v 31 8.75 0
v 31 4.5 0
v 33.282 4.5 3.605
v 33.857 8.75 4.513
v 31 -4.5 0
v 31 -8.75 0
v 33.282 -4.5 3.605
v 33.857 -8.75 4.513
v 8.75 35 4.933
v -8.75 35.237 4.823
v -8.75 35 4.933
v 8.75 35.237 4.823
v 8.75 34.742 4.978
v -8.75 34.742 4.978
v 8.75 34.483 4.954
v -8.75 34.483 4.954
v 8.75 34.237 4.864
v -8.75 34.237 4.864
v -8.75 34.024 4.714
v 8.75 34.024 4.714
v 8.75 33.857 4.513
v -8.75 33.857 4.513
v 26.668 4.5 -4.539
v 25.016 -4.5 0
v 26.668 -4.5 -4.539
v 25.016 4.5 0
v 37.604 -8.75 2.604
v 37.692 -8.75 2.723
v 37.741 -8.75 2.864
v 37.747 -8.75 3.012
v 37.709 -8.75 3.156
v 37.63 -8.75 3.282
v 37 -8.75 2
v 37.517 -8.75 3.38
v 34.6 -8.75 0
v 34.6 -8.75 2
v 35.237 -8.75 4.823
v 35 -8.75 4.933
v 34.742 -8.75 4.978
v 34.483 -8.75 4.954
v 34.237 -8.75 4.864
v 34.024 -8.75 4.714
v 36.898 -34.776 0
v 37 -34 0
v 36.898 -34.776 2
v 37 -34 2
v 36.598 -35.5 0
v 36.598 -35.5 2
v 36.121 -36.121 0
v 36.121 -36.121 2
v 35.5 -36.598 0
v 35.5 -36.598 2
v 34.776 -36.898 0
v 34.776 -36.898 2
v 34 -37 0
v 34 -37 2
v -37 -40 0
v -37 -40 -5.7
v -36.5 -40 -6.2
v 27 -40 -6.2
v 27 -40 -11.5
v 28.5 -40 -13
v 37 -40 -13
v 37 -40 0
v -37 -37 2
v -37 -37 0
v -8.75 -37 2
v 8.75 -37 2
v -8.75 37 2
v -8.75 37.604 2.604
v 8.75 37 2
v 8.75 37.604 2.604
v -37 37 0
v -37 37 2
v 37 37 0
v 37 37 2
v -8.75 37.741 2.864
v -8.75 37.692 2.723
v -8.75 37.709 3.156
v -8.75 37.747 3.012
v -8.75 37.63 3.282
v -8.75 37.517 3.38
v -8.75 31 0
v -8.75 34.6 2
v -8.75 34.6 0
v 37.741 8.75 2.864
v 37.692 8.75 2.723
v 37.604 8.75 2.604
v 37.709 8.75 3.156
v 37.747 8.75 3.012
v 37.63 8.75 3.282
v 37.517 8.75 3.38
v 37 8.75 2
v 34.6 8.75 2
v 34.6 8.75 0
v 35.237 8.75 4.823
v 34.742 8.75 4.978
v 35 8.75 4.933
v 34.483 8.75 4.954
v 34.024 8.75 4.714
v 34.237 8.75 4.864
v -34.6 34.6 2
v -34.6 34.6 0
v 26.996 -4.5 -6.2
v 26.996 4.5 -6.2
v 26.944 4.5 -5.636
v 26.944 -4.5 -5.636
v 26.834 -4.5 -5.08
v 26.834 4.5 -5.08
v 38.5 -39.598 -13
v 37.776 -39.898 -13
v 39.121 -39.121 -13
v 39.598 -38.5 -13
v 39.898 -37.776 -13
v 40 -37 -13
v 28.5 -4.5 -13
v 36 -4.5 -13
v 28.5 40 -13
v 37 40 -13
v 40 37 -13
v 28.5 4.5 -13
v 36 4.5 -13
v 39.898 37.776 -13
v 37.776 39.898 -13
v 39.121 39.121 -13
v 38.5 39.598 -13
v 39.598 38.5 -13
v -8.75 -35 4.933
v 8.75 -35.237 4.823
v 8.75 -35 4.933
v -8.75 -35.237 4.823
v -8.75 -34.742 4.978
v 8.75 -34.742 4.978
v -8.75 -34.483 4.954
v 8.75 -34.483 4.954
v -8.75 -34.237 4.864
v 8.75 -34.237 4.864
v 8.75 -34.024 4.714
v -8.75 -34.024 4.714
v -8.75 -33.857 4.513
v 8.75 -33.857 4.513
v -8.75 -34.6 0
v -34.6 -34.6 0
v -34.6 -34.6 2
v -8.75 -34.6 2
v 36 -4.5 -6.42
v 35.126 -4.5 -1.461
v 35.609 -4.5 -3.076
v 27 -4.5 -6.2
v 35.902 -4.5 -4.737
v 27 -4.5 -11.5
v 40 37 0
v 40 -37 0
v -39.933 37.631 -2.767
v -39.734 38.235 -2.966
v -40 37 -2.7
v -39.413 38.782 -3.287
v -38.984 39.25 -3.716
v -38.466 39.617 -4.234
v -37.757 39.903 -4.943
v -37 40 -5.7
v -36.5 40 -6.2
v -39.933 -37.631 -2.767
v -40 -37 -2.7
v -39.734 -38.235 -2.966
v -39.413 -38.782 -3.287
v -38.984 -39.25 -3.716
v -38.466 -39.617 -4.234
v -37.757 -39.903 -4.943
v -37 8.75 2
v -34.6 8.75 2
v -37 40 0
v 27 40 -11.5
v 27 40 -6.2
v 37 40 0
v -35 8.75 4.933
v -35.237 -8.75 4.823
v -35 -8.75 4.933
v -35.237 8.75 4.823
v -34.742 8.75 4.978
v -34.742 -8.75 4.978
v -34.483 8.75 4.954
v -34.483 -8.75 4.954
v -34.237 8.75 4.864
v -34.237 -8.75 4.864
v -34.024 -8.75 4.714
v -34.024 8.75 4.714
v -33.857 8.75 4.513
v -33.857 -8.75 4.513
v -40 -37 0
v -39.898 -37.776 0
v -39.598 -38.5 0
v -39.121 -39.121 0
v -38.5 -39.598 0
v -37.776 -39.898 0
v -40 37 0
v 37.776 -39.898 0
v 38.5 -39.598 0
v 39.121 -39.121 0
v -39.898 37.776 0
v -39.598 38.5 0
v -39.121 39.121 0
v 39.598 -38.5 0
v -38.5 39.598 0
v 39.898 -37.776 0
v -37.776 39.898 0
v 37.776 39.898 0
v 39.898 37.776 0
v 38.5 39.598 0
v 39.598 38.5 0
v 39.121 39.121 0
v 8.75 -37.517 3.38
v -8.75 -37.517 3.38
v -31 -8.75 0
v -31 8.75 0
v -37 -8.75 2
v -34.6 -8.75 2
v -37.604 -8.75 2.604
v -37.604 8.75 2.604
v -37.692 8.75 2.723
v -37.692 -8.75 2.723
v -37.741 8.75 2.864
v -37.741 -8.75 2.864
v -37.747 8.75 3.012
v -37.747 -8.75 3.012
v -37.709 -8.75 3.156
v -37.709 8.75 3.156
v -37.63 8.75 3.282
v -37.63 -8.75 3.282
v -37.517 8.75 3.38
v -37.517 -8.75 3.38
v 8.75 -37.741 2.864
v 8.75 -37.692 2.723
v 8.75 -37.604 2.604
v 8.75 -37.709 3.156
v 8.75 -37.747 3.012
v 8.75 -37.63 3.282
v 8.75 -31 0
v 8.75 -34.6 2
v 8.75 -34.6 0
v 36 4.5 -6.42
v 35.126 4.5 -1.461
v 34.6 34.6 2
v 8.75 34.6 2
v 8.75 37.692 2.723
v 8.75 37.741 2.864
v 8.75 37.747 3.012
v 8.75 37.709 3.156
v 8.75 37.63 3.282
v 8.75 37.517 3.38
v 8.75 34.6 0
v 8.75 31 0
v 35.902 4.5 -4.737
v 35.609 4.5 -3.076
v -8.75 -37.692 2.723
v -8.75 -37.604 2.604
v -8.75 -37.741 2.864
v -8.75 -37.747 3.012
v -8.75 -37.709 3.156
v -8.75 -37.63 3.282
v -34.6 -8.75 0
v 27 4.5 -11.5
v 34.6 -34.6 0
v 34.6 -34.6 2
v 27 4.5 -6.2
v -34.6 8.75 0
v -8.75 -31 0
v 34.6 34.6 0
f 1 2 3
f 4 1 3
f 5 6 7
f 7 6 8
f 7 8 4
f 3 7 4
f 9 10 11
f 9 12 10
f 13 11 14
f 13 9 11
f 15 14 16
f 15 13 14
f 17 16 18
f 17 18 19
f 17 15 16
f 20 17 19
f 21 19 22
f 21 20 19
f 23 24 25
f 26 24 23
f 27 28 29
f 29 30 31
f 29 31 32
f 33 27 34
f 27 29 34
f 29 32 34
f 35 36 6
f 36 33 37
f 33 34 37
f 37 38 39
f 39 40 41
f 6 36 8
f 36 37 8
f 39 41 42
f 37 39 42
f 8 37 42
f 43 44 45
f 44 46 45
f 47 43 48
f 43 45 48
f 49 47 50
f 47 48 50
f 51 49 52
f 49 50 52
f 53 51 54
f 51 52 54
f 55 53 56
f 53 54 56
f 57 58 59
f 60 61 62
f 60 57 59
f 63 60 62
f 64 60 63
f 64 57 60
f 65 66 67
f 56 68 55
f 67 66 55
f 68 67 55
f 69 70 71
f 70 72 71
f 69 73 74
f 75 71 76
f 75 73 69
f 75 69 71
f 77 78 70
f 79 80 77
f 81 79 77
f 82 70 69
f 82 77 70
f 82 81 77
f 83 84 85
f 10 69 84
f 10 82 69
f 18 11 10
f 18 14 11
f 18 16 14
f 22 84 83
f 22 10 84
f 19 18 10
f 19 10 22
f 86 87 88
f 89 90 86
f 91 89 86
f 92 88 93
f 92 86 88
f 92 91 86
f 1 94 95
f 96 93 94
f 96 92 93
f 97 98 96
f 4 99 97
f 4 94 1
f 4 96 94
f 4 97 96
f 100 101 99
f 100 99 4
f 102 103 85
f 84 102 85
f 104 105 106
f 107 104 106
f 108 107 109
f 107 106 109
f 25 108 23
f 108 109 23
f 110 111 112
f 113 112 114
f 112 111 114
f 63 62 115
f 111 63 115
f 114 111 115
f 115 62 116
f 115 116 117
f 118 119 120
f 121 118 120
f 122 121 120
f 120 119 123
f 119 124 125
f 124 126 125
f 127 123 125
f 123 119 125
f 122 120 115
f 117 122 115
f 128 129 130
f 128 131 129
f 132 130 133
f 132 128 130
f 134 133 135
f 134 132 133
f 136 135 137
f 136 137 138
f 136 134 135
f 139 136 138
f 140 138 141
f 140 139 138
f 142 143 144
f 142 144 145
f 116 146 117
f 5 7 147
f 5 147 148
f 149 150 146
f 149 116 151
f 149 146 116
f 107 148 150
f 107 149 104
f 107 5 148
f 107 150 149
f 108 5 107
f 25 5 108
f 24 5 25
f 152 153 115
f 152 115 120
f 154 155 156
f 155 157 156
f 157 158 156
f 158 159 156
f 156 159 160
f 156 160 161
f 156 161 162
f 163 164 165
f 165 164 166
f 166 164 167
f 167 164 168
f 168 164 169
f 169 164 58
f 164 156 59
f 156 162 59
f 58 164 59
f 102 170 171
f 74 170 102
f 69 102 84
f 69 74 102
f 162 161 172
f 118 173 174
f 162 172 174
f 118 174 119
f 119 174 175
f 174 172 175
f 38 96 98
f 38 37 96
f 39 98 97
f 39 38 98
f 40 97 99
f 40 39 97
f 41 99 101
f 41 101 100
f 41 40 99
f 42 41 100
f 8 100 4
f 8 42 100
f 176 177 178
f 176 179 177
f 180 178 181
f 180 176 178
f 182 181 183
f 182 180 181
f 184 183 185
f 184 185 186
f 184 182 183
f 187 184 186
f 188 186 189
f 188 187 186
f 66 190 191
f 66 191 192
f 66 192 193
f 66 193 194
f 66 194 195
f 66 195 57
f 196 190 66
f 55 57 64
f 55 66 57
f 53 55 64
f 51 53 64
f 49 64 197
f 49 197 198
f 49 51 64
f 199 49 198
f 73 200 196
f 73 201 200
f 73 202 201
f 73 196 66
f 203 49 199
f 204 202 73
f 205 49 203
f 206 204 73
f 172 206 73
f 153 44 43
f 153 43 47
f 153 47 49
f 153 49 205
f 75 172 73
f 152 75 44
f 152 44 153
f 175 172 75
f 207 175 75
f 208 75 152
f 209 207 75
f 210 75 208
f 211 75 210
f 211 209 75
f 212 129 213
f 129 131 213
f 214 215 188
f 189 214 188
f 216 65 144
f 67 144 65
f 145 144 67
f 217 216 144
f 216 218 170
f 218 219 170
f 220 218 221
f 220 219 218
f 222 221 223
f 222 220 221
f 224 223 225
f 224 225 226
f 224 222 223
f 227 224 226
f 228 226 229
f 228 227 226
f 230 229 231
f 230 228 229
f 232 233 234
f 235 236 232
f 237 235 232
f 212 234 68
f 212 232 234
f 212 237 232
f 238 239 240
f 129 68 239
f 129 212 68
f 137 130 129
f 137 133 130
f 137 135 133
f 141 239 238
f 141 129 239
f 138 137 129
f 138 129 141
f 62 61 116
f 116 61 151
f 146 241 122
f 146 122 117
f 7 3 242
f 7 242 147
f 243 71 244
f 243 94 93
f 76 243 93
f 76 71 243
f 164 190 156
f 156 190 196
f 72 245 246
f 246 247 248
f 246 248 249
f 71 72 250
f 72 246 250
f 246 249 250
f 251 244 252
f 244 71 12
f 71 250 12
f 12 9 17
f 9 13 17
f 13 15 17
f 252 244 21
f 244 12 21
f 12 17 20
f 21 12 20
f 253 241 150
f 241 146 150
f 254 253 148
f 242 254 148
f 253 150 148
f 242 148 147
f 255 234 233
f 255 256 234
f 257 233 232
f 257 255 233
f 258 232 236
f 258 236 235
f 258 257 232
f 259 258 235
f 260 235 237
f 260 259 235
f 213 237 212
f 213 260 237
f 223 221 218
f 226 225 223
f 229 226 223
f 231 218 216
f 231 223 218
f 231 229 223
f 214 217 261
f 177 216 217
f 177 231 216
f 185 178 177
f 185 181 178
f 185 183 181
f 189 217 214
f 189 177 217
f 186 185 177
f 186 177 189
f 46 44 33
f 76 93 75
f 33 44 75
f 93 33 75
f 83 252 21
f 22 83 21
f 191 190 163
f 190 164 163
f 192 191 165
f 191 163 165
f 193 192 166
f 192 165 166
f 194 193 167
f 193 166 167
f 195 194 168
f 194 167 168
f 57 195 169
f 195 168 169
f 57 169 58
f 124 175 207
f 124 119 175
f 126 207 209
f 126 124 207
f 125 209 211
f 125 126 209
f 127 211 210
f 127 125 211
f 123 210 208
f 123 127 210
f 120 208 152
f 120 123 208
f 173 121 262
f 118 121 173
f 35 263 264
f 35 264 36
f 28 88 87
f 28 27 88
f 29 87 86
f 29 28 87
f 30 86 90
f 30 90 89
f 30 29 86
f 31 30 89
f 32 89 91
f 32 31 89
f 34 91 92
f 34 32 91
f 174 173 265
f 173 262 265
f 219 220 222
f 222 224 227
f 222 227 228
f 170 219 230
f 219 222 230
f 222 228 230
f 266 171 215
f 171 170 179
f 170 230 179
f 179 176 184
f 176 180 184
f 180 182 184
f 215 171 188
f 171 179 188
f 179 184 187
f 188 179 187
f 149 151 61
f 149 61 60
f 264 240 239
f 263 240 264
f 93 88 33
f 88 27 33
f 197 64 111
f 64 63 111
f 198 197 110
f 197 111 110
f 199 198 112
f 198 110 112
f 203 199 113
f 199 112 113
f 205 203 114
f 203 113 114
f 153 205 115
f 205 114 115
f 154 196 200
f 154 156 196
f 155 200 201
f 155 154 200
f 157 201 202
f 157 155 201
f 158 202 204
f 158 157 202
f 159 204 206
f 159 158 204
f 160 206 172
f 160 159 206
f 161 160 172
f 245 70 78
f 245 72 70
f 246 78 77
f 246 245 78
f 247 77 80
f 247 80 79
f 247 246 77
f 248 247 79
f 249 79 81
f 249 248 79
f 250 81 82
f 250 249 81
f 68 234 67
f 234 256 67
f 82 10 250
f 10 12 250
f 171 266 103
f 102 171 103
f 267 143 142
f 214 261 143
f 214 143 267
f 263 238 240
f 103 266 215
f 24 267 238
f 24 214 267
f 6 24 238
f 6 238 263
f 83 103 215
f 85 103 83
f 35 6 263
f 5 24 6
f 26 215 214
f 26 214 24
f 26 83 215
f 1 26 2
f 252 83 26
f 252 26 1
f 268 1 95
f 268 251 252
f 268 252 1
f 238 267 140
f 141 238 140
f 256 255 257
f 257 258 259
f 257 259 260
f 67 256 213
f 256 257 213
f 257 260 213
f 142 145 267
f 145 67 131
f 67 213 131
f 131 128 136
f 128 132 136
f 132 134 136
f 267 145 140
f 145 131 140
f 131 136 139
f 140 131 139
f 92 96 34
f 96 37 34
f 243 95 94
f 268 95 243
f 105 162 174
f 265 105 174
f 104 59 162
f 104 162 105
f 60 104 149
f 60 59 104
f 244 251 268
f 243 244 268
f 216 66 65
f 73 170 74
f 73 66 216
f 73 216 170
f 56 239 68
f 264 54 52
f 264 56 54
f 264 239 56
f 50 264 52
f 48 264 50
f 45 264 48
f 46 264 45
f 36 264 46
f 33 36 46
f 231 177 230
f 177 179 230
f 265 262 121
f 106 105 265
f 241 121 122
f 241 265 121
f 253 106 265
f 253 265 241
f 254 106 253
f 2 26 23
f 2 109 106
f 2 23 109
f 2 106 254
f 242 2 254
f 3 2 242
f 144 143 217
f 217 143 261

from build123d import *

# Parameters (mm, degrees)
SKETCH_W           = 80
SKETCH_H           = 80
PAD_DEPTH          = 13
PAD001_DEPTH       = 8.75
POLARPATTERN_COUNT = 4
SKETCH006_W        = 67
SKETCH006_H        = 6.8
POCKET_DEPTH       = 40.001
POCKET_DEPTH_BACK  = 40.001
SKETCH008_W        = 9
SKETCH008_H        = 9
CHAMFER_SIZE       = 3.5
FILLET_R           = 3
CHAMFER002_SIZE    = 1.5
SKETCH014_W        = 74
SKETCH014_H        = 74
SKETCH014_W_2      = 69.2
SKETCH014_H_2      = 69.2
PAD005_DEPTH       = 2
FILLET003_R        = 3


with BuildPart() as part:
    # Sketch → Pad (new body)
    with BuildSketch(Plane.XY):
        Rectangle(SKETCH_W, SKETCH_H)
    extrude(amount=-PAD_DEPTH)

    # Sketch001 → Pad001 (join, symmetric)
    with BuildSketch(Plane.YZ):
        with BuildLine():
            Line((31, 0), (33.85683, 4.513208))
            ThreePointArc((35.236626, 4.82331), (34.482504, 4.954025), (33.85683, 4.513208))
            Line((35.236626, 4.82331), (37.517423, 3.379581))
            ThreePointArc((37.603553, 2.603553), (37.746949, 3.012262), (37.517423, 3.379581))
            Line((37.603553, 2.603553), (37, 2))
            Line((37, 2), (37, 0))
            Line((37, 0), (31, 0))
        make_face()
    pad001 = extrude(amount=PAD001_DEPTH, both=True)

    # PolarPattern: Pad001 ×4 about axis
    polarpattern_axis = Axis((0, 0, 0), (0, 0, 1))
    for i in range(1, POLARPATTERN_COUNT):
        add(pad001.rotate(polarpattern_axis, i * 360 / POLARPATTERN_COUNT))

    # Sketch006 → Pocket (cut, two sides)
    with BuildSketch(Plane.XZ) as pocket_sk:
        with Locations((-6.5, -9.6)):
            Rectangle(SKETCH006_W, SKETCH006_H)
    extrude(amount=-POCKET_DEPTH, mode=Mode.SUBTRACT)
    extrude(pocket_sk.sketch, amount=POCKET_DEPTH_BACK, mode=Mode.SUBTRACT)

    # SubtractivePipe: sweep along a path in Sketch009
    with BuildLine(Plane.XZ) as subtractivepipe_path:
        Line((31.5, -13), (31.5, -6.420201))
        ThreePointArc((31.5, -6.420201), (31.348078, -4.68372), (30.896926, -3))
        Line((30.896926, -3), (26.165313, 10))
    # Sketch008 (on Face4 of Pocket) → SubtractivePipe (sweep, cut)
    with BuildSketch(Plane(origin=(0, 0, -13), x_dir=(1, 0, 0), z_dir=(0, 0, -1))):
        with Locations((31.5, 0)):
            Rectangle(SKETCH008_W, SKETCH008_H)
    sweep(path=subtractivepipe_path.line, mode=Mode.SUBTRACT)

    # Chamfer
    chamfer_edges = [part.edges().sort_by_distance(p)[0] for p in [
        (-40, 0, -6.2),
    ]]
    chamfer(chamfer_edges, length=CHAMFER_SIZE)

    # Fillet
    fillet_edges = [part.edges().sort_by_distance(p)[0] for p in [
        (40, -40, -6.5),
        (40, 40, -6.5),
        (-40, 40, -1.35),
        (-40, -40, -1.35),
    ]]
    fillet(fillet_edges, radius=FILLET_R)

    # Chamfer002
    chamfer002_edges = [part.edges().sort_by_distance(p)[0] for p in [
        (27, 22.25, -13),
        (27, -22.25, -13),
    ]]
    chamfer(chamfer002_edges, length=CHAMFER002_SIZE)

    # Sketch014 → Pad005 (join)
    with BuildSketch(Plane.XY):
        Rectangle(SKETCH014_W, SKETCH014_H)
        Rectangle(SKETCH014_W_2, SKETCH014_H_2, mode=Mode.SUBTRACT)
    extrude(amount=PAD005_DEPTH)

    # Fillet003
    fillet003_edges = [part.edges().sort_by_distance(p)[0] for p in [
        (-35.236626, 0, 4.82331),
        (37, -37, 1),
        (0, -35.236626, 4.82331),
        (0, 35.236626, 4.82331),
    ]]
    fillet(fillet003_edges, radius=FILLET003_R)


solid = part.part
